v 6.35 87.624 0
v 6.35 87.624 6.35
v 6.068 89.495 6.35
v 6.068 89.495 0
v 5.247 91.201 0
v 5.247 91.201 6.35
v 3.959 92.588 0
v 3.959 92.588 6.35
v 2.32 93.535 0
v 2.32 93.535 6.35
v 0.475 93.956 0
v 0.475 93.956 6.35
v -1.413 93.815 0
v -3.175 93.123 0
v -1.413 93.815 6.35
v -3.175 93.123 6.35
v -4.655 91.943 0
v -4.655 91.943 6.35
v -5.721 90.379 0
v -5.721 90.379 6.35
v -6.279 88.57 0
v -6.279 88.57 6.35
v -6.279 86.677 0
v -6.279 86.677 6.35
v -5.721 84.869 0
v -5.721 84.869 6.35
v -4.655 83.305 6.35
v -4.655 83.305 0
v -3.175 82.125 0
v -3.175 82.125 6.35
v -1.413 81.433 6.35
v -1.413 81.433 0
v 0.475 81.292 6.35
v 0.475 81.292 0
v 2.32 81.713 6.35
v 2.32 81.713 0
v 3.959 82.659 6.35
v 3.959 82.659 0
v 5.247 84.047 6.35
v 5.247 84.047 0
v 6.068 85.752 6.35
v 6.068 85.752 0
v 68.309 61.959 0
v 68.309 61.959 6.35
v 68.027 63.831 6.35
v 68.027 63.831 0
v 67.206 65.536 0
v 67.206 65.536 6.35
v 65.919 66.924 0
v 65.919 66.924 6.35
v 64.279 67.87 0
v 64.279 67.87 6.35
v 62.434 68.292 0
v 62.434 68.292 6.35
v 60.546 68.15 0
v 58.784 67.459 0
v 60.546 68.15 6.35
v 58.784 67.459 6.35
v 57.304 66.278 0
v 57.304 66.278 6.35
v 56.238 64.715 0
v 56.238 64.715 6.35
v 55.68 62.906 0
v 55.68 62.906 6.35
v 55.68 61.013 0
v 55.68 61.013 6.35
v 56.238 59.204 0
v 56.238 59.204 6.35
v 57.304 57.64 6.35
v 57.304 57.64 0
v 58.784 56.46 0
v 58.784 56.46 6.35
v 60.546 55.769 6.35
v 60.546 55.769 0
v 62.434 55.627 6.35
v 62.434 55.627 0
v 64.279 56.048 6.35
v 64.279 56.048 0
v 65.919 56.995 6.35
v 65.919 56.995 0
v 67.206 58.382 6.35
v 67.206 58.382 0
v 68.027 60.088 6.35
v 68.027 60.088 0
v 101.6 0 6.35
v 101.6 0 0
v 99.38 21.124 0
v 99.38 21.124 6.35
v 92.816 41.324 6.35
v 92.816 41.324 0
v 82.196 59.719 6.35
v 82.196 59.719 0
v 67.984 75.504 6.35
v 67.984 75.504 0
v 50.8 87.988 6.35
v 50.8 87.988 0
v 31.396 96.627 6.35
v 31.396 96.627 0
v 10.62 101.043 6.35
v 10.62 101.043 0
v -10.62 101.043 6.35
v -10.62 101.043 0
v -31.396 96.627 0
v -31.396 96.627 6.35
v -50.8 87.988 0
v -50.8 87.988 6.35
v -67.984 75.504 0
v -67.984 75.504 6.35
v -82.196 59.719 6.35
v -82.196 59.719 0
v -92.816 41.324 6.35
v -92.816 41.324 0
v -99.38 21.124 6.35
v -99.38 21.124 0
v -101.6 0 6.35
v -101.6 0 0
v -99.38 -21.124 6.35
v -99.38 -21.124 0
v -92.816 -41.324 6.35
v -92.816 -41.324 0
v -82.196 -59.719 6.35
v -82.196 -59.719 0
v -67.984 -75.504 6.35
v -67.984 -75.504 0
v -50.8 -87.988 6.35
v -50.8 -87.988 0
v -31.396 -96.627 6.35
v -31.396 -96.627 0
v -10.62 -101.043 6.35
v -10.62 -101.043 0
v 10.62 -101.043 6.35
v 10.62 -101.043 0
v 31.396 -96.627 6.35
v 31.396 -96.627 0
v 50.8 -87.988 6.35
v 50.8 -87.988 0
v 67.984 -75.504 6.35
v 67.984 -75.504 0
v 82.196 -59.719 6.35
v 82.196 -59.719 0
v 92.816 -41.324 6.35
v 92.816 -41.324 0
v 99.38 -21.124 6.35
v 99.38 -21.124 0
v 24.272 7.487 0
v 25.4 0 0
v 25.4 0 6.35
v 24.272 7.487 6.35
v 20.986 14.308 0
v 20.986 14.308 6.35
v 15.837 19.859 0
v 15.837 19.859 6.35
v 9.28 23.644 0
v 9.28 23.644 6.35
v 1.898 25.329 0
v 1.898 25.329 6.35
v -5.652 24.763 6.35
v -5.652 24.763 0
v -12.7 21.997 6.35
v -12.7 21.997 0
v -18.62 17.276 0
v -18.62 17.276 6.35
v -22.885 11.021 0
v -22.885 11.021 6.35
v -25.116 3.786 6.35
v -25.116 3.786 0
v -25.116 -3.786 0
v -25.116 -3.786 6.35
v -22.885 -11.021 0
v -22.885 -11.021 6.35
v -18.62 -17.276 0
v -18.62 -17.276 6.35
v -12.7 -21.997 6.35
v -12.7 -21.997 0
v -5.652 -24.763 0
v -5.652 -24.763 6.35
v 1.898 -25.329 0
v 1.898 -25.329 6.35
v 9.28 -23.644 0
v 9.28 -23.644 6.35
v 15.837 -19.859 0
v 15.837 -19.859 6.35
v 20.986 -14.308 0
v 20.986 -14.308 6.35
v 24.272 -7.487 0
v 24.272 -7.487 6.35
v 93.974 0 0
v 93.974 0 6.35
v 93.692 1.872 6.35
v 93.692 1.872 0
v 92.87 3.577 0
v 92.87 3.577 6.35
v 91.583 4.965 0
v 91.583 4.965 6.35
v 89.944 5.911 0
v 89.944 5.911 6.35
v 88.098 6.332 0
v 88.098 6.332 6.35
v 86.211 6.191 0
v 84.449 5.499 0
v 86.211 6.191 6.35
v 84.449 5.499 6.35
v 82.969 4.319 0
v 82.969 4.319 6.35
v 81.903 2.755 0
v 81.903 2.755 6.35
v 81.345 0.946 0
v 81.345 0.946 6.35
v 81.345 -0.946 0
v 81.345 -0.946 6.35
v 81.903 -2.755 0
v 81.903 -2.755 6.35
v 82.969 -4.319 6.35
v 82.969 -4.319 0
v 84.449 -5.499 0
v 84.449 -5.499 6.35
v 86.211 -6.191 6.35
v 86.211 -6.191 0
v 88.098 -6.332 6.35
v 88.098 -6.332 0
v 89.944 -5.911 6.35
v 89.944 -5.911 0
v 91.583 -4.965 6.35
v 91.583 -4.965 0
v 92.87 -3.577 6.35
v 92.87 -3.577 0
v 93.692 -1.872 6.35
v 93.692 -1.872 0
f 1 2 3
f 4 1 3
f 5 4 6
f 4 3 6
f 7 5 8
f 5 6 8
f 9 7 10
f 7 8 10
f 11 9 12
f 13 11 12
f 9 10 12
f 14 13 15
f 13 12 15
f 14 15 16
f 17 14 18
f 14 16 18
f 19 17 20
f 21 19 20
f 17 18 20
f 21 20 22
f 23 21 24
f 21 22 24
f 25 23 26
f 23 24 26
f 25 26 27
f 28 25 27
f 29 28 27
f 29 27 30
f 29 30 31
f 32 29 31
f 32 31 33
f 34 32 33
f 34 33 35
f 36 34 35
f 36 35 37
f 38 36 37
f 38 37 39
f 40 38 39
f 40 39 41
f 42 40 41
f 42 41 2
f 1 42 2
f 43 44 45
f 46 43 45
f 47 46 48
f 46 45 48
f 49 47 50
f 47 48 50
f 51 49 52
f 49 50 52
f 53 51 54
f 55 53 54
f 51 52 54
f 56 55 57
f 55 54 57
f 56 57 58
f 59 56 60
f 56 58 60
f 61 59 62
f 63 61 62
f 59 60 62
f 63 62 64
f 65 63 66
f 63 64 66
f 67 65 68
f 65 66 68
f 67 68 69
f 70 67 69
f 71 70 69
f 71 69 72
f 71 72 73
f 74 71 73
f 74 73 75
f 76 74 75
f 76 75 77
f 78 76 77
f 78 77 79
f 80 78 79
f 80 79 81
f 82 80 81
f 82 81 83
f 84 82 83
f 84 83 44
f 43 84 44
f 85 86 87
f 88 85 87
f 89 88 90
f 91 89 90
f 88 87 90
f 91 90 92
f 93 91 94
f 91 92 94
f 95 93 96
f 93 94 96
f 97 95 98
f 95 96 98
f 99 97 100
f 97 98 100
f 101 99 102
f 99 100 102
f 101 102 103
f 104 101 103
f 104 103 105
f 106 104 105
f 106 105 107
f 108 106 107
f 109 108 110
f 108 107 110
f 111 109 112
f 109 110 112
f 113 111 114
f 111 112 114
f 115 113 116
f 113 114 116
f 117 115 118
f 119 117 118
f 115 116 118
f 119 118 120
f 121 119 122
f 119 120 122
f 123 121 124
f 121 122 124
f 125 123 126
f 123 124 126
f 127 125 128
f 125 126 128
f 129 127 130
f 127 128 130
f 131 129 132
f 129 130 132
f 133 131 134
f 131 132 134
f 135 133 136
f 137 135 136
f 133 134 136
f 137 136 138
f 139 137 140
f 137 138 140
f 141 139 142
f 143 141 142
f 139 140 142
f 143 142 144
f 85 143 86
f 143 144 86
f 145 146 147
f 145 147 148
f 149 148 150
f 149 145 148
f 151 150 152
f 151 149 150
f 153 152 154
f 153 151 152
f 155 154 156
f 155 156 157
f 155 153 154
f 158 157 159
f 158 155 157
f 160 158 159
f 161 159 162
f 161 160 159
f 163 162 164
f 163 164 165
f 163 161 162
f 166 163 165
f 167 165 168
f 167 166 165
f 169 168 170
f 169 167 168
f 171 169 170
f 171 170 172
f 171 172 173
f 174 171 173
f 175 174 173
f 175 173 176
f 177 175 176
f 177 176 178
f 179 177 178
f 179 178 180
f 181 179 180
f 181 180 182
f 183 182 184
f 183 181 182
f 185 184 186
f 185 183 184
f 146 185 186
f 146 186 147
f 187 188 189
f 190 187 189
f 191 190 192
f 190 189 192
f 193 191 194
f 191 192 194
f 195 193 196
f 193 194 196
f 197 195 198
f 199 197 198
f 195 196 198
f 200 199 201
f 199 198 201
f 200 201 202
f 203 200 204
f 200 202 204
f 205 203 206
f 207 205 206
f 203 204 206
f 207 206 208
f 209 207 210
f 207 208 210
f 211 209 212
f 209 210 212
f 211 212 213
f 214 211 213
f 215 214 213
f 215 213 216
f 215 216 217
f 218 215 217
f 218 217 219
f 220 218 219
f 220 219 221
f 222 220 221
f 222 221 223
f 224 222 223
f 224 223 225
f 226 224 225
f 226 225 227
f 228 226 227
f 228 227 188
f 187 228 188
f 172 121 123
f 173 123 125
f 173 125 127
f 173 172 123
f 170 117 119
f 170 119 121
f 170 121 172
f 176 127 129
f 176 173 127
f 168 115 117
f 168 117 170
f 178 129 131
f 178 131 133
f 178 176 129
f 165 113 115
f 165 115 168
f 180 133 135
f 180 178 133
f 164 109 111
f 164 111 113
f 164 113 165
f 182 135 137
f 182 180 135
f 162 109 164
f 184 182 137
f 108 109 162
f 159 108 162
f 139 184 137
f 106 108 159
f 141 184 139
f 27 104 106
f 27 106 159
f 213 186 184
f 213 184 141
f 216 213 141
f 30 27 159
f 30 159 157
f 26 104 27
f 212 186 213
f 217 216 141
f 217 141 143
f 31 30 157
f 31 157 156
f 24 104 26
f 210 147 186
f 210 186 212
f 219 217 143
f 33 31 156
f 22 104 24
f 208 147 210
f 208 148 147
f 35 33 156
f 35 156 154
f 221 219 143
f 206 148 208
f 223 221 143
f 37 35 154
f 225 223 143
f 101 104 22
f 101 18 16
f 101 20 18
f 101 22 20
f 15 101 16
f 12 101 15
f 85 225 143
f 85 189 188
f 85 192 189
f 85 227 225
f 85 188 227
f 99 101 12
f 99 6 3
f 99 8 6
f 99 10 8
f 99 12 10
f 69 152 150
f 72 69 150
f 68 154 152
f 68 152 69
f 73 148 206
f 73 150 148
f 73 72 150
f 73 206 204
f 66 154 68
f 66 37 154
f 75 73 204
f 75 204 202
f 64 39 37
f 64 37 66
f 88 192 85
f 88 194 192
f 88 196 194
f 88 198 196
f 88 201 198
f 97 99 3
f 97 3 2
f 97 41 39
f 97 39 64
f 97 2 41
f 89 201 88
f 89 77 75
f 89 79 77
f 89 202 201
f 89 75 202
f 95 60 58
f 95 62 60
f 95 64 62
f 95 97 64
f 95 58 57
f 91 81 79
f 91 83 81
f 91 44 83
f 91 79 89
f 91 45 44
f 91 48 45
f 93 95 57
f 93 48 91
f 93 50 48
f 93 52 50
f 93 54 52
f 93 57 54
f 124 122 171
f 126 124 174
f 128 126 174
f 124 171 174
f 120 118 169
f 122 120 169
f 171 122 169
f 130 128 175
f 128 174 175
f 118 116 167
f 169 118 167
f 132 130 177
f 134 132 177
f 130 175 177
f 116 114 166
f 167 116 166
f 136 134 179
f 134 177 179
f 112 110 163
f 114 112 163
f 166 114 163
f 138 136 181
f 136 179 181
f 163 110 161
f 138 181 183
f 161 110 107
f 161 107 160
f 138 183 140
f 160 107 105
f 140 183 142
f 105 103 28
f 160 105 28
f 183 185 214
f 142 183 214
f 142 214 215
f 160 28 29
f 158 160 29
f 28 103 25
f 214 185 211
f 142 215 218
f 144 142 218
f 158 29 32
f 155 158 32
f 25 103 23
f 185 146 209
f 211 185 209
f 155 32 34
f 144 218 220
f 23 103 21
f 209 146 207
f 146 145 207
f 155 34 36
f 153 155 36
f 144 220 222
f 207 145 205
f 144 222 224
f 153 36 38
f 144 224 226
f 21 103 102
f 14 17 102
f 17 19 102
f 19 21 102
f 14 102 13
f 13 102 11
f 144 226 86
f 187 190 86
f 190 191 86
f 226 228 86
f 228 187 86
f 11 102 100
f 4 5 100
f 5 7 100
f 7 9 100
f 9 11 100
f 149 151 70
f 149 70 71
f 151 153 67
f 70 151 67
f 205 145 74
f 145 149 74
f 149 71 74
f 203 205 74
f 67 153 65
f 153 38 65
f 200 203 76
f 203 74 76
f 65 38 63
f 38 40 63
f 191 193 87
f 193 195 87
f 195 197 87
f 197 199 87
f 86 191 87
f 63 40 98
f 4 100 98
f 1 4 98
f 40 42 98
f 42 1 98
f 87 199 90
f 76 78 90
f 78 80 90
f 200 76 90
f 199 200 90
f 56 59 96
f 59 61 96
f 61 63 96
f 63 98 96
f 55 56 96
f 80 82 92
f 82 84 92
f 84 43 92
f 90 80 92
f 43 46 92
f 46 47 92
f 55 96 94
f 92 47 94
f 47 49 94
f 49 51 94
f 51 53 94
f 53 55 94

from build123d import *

# Parameters (mm, degrees)
F0_R     = 101.6
F0_R_2   = 25.4
F1_DEPTH = 6.35
F2_R     = 6.35
F3_DEPTH = 6.351


with BuildPart() as f1:
    # F0 (on Top) → F1 (new body)
    with BuildSketch(Plane.XY):
        Circle(F0_R)
        Circle(F0_R_2, mode=Mode.SUBTRACT)
    extrude(amount=F1_DEPTH)

    # F2 (on face) → F3 (cut, through all)
    with BuildSketch(Plane.XY.offset(6.35)):
        with Locations((0, 87.623763)):
            Circle(F2_R)
        with Locations((61.959357, 61.959357)):
            Circle(F2_R)
        with Locations((87.623763, 0)):
            Circle(F2_R)
    extrude(amount=-F3_DEPTH, mode=Mode.SUBTRACT)


solid = f1.part
